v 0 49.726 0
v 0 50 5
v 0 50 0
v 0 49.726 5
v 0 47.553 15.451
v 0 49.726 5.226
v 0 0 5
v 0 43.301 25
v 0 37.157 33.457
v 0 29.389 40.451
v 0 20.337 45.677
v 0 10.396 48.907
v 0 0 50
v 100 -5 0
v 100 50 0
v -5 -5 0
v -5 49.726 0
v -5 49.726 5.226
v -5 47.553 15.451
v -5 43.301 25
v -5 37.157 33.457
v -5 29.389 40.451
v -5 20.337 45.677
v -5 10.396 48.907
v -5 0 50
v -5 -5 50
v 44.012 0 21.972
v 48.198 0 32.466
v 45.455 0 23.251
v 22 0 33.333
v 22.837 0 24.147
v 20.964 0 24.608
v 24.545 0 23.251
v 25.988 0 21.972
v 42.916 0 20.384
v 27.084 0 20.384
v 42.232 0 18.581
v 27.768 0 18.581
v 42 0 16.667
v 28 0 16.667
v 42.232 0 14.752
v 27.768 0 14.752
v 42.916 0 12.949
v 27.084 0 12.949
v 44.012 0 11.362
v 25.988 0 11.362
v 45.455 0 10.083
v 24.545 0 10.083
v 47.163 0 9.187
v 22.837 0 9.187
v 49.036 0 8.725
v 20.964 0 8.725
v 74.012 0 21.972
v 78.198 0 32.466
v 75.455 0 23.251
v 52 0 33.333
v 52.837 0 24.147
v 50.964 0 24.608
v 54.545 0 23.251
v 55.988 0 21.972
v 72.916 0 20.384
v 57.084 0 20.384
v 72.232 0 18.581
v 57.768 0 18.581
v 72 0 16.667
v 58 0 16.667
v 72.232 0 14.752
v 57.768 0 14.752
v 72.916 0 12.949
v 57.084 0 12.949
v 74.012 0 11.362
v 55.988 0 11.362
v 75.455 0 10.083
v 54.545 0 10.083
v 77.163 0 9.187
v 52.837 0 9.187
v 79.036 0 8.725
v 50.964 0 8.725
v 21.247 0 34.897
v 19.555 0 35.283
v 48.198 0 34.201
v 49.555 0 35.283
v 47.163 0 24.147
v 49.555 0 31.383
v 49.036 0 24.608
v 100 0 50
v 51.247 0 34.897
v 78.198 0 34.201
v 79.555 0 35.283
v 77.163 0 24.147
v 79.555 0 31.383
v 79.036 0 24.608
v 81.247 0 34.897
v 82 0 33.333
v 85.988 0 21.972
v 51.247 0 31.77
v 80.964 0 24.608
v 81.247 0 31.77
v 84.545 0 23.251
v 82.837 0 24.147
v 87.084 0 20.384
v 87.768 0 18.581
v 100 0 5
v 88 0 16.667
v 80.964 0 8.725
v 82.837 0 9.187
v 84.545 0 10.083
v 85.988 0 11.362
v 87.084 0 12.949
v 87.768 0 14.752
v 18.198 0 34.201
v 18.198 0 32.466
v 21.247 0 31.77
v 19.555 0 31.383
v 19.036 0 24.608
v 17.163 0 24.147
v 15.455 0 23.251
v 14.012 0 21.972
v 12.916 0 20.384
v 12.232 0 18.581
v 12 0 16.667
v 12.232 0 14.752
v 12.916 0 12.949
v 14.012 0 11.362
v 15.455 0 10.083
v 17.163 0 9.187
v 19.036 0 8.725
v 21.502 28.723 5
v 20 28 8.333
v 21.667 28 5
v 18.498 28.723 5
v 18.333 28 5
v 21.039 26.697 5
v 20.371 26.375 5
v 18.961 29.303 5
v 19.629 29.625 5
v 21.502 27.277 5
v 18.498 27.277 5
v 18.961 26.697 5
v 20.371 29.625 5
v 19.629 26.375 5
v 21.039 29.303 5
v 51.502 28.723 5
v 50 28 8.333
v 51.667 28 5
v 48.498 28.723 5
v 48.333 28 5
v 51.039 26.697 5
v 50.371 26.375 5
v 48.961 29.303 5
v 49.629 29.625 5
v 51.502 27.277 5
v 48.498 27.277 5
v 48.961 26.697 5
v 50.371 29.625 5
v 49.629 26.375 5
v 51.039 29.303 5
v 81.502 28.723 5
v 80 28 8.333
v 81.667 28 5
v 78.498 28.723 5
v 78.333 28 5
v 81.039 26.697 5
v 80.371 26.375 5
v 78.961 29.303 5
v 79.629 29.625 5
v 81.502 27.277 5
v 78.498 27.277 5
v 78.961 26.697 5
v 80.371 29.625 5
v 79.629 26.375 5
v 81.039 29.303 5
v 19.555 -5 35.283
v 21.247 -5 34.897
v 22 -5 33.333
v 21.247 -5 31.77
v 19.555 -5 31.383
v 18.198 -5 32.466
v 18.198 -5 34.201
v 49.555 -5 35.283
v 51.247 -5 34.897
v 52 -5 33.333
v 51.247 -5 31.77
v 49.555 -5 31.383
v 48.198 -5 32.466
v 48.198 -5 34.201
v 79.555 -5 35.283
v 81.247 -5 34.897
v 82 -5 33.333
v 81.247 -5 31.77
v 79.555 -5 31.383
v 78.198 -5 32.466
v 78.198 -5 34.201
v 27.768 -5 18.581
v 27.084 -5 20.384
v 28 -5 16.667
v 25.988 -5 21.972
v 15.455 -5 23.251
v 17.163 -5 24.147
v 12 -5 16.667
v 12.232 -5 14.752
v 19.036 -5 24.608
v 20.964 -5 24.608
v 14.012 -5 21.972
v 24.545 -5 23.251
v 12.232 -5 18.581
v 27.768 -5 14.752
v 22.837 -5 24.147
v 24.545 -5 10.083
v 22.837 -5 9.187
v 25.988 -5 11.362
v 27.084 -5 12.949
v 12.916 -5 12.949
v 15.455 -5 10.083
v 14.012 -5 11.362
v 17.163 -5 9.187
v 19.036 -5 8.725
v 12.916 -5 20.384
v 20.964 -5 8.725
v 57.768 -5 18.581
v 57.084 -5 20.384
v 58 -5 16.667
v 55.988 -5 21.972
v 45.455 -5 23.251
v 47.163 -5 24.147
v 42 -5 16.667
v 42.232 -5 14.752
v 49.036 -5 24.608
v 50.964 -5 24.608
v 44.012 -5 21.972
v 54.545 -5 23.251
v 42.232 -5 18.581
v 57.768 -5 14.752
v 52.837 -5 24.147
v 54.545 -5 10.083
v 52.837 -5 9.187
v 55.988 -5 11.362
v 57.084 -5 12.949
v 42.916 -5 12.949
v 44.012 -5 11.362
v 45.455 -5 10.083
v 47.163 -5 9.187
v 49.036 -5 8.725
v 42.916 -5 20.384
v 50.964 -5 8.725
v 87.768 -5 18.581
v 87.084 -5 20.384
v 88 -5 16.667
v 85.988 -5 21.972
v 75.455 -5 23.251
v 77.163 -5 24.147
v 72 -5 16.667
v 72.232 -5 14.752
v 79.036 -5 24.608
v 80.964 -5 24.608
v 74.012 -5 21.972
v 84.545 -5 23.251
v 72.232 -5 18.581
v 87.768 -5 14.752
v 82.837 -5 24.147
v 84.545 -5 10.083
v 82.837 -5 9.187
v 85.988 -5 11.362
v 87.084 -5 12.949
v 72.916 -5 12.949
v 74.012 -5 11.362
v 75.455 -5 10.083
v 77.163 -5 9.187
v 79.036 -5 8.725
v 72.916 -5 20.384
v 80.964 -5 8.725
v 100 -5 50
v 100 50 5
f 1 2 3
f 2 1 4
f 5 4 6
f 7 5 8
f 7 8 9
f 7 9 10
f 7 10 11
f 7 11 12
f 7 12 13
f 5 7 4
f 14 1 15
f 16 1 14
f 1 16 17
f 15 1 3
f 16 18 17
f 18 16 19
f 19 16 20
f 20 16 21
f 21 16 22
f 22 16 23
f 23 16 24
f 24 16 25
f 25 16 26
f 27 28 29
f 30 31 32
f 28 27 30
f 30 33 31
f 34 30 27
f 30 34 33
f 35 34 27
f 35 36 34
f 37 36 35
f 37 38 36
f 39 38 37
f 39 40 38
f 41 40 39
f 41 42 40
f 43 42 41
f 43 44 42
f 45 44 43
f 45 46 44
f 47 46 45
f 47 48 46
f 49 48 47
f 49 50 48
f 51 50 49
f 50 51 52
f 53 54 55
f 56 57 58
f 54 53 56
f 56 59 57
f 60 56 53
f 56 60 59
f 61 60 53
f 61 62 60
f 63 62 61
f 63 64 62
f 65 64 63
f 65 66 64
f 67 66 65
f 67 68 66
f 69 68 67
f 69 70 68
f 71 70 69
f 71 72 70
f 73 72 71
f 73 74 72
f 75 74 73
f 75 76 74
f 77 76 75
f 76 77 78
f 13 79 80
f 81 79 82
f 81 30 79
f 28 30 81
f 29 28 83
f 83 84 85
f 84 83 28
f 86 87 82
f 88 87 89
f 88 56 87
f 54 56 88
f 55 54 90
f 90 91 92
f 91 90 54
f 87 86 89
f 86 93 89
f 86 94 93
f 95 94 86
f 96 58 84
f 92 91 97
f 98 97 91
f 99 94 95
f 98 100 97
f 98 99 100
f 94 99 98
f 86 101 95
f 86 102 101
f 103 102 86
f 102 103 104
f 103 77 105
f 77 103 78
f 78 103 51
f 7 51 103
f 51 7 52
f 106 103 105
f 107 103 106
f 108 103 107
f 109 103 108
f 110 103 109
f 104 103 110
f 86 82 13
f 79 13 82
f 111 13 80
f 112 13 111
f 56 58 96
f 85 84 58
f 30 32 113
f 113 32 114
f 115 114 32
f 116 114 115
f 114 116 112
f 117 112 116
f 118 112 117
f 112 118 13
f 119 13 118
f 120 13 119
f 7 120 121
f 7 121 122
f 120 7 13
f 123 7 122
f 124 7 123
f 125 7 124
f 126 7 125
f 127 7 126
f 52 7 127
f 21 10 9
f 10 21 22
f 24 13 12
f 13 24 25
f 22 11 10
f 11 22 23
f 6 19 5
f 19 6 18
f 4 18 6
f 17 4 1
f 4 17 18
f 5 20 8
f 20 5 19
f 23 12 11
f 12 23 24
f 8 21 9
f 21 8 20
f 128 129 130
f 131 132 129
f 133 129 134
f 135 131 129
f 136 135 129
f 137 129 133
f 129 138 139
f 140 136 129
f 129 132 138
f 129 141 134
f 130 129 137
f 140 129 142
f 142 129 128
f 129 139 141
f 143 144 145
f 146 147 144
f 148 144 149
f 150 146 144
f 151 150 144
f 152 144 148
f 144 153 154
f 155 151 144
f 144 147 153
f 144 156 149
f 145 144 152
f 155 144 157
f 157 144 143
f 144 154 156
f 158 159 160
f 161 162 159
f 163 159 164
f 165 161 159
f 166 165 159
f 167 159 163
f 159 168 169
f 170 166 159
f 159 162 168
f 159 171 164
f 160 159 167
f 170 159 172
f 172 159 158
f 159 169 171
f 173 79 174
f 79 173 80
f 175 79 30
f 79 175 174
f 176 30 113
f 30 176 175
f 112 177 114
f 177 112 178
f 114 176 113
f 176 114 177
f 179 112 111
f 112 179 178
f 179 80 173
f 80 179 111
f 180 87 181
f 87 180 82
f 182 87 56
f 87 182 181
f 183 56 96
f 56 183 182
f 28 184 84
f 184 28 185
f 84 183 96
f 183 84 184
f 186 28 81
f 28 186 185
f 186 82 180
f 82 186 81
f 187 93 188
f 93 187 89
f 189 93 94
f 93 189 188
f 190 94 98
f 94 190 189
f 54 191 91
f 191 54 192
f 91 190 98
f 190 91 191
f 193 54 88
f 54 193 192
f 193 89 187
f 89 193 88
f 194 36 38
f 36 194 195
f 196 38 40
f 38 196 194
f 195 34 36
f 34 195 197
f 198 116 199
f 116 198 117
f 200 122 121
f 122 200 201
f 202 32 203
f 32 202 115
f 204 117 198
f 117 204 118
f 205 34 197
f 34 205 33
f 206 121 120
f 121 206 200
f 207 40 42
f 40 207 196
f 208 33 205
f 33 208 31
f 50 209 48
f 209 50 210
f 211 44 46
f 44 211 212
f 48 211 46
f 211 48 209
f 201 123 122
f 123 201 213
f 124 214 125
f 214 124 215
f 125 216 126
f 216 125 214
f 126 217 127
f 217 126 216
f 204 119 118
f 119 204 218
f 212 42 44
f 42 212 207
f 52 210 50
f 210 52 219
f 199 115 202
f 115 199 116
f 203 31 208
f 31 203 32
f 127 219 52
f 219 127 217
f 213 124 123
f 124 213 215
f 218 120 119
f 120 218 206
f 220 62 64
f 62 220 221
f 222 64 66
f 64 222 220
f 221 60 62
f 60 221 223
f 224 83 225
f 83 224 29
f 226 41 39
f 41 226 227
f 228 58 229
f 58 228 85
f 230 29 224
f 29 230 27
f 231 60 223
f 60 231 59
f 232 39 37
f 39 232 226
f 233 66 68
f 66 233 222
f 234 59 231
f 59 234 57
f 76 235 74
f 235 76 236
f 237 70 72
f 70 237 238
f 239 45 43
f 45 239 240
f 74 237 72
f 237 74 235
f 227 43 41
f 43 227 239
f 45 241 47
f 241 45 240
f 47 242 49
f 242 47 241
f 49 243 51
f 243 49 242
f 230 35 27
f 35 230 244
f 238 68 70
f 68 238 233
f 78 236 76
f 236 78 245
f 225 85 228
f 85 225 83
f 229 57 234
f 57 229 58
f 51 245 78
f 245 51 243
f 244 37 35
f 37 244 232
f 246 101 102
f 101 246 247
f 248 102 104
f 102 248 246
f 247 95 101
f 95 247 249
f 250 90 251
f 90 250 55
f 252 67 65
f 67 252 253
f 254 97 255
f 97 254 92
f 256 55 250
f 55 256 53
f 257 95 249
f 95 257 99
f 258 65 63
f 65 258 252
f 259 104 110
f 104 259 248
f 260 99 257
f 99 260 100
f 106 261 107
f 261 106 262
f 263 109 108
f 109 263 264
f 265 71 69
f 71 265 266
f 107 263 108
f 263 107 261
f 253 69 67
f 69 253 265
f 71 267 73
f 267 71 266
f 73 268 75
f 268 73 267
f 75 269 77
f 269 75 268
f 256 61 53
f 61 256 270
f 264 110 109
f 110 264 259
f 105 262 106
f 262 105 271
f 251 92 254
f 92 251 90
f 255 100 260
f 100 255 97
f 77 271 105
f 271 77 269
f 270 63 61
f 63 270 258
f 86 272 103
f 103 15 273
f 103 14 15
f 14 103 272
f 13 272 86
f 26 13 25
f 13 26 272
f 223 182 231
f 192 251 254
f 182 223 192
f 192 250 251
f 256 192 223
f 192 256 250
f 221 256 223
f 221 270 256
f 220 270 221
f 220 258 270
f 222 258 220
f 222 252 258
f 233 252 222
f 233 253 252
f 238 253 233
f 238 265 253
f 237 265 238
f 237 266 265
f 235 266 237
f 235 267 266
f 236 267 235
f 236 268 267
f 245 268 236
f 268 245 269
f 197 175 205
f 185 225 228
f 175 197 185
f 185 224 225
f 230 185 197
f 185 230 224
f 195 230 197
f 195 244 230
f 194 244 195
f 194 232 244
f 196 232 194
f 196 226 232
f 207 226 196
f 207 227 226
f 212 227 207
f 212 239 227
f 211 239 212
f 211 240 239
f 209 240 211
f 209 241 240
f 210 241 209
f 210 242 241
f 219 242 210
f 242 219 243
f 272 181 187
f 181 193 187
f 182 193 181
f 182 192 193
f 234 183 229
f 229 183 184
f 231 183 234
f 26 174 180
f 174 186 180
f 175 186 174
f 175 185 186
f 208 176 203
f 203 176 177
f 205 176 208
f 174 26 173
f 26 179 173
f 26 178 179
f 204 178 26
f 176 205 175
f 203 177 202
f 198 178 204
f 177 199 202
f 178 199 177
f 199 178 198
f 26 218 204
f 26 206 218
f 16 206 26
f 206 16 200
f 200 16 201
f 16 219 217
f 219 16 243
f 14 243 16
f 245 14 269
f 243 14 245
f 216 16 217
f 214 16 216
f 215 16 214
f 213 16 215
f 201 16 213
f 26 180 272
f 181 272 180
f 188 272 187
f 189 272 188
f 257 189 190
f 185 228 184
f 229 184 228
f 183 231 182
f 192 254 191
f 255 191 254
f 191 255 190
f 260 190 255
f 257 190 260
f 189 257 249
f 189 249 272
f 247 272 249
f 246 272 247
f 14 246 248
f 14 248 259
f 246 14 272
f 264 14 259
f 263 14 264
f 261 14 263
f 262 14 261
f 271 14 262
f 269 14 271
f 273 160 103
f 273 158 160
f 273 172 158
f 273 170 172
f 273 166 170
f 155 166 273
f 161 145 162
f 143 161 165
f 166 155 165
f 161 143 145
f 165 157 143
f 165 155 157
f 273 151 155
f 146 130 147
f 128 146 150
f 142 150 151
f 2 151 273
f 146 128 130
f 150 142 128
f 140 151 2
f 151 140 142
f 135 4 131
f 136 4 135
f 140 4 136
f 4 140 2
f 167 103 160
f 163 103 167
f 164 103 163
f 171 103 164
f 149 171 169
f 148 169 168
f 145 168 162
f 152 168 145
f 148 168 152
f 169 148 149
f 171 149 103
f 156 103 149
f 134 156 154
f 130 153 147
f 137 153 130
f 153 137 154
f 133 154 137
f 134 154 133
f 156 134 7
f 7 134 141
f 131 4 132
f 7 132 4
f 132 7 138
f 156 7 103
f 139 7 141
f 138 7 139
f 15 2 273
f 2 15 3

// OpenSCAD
// Markeriungen für die Bohrlöcher der Werkbank


drillhole_markings =[20,50,80];
drillhole_side_distance = 28;
guide_lenght = 100;
guide_width = 50;
guide_thickness = 5;


cube([guide_lenght,guide_width,guide_thickness]);
top_wall();
hole_markings();
difference()
{
    side_wall();
    rotate([90,0,0])
    {   drill_guides();
        translate([0,-1/3*guide_width,0])
            drill_guides(16);  
    }
}

module drill_guides(dia = 4)
{
    translate([0,2/3*guide_width,0])
    {
        for(i = [0:len(drillhole_markings)-1])
        {
            if(drillhole_markings[i] < guide_lenght)
            {
                translate([drillhole_markings[i],0,0]) guide_hole(dia);
            }
            else
            {
                echo("marking outside of lenght");
            }
        }
    }
}

module side_wall()
{
    translate([-guide_thickness,-guide_thickness,0])
    cube([guide_lenght+guide_thickness,guide_thickness,guide_width]);
}

module hole_markings()
{
    translate([0,drillhole_side_distance,0])
    {
        for(i = [0:len(drillhole_markings)-1])
        {
            if(drillhole_markings[i] < guide_lenght)
            {
                translate([drillhole_markings[i],0,0]) hole_marker();
            }
            else
            {
                echo("marking outside of lenght");
            }
        }
    }
}







module hole_marker(markerheight = 5/3*guide_thickness)
{
    cylinder(d1=markerheight, d2=0, h=markerheight, center = false);
}

module guide_hole(guide_diameter = 4)
{
    cylinder(d=guide_diameter, h=2*guide_thickness, center = false);
}

module top_wall()
{
    intersection()
    {
        translate([-guide_thickness,0,0])
            cube([guide_thickness,guide_width,guide_width]);

        rotate([0,-90,0])
            cylinder(r=guide_width,h=guide_thickness);
    }
}
